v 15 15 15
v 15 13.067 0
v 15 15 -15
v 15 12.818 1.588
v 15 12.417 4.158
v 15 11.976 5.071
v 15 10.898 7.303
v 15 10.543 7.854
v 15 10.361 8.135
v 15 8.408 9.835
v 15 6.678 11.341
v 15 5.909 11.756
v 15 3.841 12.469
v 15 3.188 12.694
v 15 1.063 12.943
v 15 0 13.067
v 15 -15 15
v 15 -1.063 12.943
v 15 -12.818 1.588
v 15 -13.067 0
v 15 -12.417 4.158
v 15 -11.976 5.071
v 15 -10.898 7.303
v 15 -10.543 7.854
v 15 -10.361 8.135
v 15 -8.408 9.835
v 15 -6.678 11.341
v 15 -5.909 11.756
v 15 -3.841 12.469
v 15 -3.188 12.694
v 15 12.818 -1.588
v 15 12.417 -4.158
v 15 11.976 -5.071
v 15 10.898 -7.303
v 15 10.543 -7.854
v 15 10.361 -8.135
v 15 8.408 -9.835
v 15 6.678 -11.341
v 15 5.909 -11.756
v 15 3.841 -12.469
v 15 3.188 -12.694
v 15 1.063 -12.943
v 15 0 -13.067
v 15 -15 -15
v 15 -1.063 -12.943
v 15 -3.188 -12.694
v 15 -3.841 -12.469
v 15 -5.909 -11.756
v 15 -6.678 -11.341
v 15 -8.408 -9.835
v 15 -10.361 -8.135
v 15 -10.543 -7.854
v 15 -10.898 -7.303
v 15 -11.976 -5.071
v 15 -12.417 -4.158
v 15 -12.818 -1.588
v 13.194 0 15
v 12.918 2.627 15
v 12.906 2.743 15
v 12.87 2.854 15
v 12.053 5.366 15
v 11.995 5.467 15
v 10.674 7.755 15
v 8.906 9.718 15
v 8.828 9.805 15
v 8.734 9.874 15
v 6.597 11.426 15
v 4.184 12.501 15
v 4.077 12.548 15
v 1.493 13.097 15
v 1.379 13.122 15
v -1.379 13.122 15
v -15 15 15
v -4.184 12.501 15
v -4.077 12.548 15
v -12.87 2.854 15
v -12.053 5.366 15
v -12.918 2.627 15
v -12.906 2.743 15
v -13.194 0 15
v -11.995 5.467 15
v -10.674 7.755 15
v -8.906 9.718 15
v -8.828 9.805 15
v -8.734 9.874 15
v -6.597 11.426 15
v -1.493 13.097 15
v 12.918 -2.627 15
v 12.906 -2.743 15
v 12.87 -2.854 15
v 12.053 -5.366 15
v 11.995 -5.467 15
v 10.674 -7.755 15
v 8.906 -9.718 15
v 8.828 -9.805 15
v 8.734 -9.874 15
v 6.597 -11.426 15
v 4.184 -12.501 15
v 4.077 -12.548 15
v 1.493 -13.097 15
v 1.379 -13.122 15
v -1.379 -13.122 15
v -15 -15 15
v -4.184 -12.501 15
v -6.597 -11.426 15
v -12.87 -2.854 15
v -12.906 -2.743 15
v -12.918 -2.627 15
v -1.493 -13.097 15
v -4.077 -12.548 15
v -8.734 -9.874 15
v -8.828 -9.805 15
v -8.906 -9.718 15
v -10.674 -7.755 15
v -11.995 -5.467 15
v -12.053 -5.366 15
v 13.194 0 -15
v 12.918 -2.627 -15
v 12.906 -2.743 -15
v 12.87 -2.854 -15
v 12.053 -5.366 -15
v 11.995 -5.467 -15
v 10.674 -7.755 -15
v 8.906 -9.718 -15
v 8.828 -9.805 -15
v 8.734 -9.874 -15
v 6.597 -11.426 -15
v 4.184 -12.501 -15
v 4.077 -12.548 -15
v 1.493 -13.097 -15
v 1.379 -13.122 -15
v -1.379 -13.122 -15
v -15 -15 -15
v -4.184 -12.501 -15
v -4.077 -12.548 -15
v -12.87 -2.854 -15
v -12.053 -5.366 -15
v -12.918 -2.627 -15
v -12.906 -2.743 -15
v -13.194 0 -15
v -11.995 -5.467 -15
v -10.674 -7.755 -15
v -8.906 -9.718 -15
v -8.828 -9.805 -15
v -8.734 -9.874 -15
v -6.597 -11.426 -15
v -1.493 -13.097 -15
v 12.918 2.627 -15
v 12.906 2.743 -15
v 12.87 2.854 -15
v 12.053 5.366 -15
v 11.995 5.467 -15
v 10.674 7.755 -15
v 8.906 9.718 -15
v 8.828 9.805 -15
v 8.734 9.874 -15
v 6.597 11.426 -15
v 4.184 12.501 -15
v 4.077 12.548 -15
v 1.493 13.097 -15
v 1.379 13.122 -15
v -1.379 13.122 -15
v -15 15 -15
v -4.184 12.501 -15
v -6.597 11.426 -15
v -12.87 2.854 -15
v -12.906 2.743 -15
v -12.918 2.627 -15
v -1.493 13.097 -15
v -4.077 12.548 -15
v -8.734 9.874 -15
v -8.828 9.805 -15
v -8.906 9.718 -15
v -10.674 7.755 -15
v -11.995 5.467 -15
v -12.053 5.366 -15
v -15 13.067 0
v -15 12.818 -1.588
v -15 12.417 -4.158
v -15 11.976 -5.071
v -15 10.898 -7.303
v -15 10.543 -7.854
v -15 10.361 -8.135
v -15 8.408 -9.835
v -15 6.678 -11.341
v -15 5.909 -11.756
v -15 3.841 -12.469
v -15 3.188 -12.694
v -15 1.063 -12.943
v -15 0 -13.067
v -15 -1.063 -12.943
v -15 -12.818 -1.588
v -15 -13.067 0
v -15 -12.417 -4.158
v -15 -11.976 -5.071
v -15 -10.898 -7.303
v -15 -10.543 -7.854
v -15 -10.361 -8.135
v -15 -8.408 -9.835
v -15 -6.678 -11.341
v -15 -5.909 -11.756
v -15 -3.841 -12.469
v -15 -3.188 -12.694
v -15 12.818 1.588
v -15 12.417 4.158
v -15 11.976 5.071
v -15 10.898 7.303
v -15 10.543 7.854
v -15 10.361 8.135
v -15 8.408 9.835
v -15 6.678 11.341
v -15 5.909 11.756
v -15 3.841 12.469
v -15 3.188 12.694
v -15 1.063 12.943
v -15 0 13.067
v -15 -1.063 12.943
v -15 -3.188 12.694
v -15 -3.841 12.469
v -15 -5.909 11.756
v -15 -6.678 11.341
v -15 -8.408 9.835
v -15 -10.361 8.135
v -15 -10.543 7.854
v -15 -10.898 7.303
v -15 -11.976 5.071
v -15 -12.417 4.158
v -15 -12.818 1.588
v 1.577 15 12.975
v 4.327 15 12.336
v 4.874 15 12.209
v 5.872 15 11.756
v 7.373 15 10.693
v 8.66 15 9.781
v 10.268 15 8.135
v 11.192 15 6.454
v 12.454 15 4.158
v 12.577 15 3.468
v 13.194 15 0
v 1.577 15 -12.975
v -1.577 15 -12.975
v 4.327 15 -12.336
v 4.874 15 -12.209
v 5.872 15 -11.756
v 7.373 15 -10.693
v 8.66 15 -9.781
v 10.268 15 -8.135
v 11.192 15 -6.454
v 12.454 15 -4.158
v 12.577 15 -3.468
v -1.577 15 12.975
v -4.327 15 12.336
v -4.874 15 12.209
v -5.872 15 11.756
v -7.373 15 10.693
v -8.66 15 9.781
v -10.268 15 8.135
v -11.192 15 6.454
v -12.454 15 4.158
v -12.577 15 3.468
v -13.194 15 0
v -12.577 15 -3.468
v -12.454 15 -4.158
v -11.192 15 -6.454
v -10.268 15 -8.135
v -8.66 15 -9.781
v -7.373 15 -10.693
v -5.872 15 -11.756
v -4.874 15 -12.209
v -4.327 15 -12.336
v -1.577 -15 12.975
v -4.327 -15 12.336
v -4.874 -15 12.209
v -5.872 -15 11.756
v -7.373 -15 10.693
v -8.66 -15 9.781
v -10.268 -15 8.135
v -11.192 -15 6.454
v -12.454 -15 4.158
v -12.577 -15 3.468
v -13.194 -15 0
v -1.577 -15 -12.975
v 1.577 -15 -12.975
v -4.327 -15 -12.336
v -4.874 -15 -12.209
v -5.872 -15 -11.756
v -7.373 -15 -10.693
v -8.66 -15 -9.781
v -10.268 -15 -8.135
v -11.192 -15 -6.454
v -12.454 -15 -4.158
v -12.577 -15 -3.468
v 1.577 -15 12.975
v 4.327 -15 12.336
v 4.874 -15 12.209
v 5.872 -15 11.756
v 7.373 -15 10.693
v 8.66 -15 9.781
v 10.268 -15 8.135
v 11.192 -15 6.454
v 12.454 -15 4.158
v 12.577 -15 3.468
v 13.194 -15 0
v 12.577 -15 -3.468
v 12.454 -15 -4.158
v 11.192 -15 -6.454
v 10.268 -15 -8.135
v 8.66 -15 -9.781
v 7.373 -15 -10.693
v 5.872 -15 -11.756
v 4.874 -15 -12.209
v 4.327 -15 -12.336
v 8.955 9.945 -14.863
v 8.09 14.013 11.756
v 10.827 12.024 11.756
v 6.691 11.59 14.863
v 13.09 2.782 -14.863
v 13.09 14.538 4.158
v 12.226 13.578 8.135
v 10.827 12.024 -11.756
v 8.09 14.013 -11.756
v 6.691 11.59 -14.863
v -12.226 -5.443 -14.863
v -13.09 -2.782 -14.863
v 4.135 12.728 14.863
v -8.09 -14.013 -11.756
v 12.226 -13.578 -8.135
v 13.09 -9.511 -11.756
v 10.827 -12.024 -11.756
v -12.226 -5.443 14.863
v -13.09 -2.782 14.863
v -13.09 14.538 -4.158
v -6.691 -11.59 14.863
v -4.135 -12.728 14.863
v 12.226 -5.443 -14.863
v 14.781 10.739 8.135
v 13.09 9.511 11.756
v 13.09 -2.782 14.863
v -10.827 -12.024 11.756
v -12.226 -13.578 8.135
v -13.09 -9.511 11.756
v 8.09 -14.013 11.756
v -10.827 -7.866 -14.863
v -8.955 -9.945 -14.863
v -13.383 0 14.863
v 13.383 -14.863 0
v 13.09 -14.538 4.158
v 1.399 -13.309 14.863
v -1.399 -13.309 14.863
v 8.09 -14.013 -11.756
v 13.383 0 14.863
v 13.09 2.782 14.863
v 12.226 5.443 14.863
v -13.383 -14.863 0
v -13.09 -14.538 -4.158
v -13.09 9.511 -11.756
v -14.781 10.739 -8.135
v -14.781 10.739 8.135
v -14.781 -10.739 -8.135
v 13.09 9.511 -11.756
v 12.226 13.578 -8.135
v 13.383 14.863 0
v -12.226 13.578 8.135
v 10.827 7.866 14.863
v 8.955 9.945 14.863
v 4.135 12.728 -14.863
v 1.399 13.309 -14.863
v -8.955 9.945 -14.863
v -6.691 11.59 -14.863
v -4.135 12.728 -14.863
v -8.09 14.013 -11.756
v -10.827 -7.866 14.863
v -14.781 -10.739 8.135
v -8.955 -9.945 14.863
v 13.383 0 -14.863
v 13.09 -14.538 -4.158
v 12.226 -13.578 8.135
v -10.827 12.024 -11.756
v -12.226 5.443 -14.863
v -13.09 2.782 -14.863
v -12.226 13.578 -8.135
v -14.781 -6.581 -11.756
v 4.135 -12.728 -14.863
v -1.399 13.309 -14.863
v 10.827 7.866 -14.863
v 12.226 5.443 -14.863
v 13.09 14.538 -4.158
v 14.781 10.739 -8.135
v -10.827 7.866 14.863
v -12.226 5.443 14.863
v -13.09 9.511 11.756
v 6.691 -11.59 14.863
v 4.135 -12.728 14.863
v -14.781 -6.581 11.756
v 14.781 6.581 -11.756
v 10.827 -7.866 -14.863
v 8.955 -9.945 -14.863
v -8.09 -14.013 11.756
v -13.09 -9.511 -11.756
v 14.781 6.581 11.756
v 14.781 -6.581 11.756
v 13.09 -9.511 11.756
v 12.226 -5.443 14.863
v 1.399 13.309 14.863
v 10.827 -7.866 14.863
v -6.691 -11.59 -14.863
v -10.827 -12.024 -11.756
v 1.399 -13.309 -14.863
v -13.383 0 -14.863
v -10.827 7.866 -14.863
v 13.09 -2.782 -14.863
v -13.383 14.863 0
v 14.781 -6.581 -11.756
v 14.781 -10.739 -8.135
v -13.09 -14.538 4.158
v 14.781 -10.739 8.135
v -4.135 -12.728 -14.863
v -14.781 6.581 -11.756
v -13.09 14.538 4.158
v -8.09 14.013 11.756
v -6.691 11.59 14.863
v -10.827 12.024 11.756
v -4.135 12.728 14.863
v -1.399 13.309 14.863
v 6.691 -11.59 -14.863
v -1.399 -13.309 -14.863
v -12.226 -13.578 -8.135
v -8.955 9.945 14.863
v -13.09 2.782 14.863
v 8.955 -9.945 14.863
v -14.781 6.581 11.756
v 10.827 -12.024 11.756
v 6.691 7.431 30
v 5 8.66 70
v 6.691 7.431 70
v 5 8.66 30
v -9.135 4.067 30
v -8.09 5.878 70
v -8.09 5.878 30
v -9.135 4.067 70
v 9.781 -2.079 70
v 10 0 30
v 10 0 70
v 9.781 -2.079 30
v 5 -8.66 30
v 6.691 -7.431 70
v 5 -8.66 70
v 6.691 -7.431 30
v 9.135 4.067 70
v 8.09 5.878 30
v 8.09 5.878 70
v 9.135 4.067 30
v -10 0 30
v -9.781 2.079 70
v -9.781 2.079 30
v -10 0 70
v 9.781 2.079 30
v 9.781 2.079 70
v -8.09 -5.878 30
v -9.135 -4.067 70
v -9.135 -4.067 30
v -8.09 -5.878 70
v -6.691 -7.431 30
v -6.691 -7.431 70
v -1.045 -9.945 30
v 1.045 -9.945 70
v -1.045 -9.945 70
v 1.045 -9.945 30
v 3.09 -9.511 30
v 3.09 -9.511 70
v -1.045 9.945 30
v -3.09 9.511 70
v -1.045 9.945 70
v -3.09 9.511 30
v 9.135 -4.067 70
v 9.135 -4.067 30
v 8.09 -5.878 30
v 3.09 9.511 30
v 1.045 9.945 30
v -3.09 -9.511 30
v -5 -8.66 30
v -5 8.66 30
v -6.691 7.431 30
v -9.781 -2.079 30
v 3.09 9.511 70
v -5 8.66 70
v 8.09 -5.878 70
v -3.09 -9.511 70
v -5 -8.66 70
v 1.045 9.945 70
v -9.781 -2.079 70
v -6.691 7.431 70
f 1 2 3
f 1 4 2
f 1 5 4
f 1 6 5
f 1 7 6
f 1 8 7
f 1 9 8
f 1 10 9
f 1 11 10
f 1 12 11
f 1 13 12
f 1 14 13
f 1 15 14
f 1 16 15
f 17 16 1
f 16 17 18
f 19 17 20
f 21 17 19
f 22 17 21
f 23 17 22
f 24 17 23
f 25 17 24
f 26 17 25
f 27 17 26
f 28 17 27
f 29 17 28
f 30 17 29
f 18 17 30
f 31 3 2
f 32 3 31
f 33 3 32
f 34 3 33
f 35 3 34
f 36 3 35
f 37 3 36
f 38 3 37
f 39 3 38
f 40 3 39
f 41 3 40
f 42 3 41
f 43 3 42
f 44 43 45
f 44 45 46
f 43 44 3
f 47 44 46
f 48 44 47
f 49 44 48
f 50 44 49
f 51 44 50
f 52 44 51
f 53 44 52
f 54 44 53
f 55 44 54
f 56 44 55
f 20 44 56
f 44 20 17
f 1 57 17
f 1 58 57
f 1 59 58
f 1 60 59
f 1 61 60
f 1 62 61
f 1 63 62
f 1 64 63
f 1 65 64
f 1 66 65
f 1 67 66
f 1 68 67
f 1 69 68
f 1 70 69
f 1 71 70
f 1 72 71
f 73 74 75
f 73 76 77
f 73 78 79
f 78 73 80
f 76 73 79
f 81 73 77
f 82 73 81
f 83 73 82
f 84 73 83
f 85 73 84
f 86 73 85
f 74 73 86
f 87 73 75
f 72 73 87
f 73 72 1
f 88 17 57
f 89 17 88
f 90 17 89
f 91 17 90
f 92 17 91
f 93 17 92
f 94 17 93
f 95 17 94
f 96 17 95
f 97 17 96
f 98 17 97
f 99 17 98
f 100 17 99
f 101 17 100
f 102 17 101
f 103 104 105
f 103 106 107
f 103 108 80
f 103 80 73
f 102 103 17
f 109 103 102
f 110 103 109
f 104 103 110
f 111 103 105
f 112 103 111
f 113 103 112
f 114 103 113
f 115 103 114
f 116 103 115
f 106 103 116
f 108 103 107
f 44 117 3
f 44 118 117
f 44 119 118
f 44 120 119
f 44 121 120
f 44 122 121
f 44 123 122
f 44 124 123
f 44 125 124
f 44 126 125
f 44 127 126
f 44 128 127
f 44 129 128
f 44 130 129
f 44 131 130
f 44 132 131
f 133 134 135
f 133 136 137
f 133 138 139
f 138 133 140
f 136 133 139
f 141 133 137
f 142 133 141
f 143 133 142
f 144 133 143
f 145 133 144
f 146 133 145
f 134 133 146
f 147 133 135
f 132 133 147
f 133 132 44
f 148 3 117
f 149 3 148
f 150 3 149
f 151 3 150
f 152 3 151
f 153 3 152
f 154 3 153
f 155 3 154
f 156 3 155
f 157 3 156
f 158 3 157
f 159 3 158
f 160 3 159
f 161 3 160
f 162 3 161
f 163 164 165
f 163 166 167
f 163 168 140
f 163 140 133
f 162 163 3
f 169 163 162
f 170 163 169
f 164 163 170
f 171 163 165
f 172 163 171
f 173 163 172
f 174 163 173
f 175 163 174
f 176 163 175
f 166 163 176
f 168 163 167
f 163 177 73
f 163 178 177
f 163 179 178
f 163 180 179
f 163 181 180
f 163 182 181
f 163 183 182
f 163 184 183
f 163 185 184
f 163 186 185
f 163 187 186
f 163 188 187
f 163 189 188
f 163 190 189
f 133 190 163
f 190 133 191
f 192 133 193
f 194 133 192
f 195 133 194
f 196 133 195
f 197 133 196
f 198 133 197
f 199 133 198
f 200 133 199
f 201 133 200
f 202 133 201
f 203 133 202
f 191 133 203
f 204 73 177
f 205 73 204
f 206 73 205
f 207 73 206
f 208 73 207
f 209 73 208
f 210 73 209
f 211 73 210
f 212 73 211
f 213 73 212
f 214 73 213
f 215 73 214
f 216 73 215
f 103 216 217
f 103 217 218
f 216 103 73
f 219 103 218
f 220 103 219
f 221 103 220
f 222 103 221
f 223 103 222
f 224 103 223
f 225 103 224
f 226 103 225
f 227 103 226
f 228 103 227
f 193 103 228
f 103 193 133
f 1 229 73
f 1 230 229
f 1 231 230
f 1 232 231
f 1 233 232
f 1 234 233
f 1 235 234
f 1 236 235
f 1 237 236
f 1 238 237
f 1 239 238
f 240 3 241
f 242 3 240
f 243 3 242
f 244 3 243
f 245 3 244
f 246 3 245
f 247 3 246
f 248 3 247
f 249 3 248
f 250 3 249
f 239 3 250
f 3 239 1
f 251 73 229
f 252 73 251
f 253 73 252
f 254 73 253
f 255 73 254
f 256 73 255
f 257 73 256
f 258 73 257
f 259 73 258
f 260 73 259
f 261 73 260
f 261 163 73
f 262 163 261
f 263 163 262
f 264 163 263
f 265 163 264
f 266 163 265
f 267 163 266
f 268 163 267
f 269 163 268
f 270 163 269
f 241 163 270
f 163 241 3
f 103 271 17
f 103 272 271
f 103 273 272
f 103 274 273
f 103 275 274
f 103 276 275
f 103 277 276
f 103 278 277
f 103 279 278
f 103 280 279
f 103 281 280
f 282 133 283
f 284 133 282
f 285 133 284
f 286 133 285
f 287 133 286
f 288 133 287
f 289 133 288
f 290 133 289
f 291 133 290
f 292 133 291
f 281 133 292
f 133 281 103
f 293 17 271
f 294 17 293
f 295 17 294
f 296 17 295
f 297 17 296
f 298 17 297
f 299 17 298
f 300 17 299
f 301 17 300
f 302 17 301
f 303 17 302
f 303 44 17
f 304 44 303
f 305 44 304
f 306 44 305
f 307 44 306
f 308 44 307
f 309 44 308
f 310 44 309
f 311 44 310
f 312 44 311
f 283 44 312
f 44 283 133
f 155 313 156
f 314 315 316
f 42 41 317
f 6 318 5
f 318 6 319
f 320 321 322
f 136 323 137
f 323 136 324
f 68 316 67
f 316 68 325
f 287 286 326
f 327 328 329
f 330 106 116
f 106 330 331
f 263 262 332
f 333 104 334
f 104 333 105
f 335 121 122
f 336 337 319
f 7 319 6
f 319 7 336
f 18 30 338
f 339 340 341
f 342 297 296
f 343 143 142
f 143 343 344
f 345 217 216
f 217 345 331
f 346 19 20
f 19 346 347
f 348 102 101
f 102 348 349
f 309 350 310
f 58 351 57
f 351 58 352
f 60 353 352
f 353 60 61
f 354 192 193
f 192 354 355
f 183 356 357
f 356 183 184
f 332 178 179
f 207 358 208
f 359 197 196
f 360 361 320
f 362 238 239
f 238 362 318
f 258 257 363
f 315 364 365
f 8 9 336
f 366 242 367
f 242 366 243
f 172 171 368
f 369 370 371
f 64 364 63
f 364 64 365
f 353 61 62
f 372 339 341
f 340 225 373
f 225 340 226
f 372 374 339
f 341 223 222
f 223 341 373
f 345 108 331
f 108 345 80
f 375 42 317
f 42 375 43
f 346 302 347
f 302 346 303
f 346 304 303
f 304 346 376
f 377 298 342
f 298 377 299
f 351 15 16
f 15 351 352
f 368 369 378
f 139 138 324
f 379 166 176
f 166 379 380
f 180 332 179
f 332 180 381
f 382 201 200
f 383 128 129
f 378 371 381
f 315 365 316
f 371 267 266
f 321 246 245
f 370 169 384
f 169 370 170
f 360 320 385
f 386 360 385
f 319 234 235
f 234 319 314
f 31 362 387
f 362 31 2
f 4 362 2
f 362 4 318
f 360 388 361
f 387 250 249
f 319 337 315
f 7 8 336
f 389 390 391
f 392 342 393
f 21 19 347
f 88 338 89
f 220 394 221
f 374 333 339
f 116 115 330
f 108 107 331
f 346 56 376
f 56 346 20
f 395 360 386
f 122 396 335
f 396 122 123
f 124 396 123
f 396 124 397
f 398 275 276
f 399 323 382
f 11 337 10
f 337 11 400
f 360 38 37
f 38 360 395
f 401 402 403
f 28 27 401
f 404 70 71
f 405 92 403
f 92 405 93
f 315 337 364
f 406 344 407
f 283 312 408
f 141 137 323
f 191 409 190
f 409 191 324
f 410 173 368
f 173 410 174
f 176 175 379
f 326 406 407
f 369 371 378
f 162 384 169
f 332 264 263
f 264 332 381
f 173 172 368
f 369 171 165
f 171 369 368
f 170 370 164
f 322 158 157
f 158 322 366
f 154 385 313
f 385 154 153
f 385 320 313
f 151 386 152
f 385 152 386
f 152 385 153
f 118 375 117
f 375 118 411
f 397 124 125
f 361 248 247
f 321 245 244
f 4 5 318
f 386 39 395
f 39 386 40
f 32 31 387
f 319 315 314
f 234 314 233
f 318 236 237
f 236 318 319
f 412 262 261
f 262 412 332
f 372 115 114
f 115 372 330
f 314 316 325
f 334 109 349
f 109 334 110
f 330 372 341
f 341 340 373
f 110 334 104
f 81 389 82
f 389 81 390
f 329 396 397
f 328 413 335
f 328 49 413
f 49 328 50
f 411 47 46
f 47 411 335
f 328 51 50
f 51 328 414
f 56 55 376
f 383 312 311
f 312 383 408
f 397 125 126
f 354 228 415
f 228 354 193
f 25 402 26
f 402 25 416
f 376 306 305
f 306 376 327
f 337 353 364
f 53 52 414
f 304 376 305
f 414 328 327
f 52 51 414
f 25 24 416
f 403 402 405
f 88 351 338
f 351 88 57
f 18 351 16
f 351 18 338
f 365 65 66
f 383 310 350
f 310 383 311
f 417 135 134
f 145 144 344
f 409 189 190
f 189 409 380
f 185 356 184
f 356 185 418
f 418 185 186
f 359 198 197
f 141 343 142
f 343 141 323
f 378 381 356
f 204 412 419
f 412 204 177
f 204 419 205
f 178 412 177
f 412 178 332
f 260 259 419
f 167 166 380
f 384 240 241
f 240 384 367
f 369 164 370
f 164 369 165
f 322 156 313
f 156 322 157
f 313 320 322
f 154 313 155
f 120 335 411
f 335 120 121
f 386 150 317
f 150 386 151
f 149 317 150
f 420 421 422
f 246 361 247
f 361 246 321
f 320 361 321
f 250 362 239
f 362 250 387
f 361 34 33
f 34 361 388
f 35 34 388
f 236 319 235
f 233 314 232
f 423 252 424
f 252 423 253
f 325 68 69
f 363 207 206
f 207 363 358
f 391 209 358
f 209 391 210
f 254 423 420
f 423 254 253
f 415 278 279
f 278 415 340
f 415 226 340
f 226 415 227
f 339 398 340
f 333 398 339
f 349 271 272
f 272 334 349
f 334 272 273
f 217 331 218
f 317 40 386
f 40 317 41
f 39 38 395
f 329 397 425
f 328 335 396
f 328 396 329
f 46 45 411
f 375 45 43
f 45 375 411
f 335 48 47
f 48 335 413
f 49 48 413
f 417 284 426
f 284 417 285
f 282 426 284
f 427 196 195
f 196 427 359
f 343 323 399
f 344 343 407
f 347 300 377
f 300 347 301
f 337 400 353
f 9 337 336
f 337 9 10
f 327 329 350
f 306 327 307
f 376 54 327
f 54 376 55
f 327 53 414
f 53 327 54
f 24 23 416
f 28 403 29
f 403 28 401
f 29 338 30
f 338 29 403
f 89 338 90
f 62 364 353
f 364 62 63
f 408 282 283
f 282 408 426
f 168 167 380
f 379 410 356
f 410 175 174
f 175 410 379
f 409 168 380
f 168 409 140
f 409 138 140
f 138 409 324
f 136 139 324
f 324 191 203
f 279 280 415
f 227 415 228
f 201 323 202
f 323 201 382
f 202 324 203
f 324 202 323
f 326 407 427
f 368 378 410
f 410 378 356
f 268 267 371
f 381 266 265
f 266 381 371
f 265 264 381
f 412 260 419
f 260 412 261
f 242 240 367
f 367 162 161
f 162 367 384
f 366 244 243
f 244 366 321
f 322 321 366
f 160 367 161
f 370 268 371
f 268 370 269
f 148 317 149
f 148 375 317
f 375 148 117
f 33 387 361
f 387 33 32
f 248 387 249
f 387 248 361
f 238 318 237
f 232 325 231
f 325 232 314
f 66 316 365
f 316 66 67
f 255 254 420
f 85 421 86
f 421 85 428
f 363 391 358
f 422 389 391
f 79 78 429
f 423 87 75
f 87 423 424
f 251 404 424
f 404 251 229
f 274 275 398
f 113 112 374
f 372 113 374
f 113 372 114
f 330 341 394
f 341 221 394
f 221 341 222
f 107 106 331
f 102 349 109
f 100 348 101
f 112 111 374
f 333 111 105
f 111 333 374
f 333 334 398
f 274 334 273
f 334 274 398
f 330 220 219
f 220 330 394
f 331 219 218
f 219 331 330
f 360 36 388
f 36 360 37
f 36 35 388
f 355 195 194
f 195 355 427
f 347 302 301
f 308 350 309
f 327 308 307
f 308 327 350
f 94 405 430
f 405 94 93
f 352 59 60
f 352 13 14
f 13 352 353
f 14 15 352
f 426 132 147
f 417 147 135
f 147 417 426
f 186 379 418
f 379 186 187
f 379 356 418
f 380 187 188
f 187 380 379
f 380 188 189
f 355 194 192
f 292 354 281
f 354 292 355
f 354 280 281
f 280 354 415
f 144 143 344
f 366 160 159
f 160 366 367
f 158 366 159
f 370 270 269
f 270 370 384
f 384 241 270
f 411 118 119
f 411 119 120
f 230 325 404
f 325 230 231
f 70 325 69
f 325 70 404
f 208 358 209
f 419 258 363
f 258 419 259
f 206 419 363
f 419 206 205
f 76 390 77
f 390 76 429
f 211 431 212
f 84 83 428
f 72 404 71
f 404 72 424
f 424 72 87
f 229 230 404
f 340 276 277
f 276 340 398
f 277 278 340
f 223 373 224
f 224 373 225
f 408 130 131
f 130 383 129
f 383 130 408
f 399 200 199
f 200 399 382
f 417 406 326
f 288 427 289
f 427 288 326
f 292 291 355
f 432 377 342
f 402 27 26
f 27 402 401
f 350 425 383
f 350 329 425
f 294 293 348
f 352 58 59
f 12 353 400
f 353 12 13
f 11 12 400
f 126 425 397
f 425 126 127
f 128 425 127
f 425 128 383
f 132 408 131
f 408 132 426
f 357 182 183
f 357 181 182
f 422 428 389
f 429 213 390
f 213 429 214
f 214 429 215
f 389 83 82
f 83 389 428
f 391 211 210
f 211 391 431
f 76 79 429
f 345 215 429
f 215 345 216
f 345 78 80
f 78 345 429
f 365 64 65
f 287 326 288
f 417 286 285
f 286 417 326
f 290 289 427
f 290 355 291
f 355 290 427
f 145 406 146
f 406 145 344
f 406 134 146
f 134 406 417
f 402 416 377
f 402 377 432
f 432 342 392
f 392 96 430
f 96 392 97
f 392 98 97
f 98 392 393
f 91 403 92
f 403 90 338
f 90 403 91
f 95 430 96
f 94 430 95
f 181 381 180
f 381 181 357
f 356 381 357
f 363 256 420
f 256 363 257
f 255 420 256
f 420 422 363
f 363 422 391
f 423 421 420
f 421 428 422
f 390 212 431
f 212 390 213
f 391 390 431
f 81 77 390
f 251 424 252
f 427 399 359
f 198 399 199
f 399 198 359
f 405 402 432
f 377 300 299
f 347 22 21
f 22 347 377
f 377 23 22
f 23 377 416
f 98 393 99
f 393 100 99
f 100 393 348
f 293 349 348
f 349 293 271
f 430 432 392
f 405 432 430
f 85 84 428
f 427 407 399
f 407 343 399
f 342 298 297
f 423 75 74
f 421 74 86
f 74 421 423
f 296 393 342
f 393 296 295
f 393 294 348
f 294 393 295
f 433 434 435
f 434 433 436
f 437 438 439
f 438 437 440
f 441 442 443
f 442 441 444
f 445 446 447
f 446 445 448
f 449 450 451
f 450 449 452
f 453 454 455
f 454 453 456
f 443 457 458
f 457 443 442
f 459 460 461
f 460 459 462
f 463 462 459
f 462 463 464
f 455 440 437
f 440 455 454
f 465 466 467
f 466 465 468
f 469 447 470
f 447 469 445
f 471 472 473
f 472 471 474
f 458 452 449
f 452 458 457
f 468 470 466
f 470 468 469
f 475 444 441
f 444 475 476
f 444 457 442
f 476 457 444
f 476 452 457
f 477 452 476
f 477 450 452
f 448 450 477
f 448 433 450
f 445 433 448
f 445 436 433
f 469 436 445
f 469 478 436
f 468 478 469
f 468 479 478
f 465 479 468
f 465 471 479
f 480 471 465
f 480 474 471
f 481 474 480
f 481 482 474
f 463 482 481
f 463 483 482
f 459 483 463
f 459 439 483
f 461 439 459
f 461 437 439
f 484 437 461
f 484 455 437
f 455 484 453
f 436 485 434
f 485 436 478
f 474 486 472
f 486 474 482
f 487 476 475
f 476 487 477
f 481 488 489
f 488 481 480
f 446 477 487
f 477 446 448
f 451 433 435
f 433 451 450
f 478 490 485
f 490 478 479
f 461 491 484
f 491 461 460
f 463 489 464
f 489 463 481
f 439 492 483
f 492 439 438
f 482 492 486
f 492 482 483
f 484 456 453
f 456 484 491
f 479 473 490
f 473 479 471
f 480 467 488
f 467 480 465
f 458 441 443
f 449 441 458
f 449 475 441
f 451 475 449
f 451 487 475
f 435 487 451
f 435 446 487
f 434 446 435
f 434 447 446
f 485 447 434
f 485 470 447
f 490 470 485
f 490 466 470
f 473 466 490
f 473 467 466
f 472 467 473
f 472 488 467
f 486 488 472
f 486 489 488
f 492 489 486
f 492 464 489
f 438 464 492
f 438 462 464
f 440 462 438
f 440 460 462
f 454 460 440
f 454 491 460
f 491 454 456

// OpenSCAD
difference() {
 	cube(30, center=true);
 	sphere(20);
 }
 translate([0, 0, 30-$t]) {
 	cylinder(h=40, r=10);
 }
